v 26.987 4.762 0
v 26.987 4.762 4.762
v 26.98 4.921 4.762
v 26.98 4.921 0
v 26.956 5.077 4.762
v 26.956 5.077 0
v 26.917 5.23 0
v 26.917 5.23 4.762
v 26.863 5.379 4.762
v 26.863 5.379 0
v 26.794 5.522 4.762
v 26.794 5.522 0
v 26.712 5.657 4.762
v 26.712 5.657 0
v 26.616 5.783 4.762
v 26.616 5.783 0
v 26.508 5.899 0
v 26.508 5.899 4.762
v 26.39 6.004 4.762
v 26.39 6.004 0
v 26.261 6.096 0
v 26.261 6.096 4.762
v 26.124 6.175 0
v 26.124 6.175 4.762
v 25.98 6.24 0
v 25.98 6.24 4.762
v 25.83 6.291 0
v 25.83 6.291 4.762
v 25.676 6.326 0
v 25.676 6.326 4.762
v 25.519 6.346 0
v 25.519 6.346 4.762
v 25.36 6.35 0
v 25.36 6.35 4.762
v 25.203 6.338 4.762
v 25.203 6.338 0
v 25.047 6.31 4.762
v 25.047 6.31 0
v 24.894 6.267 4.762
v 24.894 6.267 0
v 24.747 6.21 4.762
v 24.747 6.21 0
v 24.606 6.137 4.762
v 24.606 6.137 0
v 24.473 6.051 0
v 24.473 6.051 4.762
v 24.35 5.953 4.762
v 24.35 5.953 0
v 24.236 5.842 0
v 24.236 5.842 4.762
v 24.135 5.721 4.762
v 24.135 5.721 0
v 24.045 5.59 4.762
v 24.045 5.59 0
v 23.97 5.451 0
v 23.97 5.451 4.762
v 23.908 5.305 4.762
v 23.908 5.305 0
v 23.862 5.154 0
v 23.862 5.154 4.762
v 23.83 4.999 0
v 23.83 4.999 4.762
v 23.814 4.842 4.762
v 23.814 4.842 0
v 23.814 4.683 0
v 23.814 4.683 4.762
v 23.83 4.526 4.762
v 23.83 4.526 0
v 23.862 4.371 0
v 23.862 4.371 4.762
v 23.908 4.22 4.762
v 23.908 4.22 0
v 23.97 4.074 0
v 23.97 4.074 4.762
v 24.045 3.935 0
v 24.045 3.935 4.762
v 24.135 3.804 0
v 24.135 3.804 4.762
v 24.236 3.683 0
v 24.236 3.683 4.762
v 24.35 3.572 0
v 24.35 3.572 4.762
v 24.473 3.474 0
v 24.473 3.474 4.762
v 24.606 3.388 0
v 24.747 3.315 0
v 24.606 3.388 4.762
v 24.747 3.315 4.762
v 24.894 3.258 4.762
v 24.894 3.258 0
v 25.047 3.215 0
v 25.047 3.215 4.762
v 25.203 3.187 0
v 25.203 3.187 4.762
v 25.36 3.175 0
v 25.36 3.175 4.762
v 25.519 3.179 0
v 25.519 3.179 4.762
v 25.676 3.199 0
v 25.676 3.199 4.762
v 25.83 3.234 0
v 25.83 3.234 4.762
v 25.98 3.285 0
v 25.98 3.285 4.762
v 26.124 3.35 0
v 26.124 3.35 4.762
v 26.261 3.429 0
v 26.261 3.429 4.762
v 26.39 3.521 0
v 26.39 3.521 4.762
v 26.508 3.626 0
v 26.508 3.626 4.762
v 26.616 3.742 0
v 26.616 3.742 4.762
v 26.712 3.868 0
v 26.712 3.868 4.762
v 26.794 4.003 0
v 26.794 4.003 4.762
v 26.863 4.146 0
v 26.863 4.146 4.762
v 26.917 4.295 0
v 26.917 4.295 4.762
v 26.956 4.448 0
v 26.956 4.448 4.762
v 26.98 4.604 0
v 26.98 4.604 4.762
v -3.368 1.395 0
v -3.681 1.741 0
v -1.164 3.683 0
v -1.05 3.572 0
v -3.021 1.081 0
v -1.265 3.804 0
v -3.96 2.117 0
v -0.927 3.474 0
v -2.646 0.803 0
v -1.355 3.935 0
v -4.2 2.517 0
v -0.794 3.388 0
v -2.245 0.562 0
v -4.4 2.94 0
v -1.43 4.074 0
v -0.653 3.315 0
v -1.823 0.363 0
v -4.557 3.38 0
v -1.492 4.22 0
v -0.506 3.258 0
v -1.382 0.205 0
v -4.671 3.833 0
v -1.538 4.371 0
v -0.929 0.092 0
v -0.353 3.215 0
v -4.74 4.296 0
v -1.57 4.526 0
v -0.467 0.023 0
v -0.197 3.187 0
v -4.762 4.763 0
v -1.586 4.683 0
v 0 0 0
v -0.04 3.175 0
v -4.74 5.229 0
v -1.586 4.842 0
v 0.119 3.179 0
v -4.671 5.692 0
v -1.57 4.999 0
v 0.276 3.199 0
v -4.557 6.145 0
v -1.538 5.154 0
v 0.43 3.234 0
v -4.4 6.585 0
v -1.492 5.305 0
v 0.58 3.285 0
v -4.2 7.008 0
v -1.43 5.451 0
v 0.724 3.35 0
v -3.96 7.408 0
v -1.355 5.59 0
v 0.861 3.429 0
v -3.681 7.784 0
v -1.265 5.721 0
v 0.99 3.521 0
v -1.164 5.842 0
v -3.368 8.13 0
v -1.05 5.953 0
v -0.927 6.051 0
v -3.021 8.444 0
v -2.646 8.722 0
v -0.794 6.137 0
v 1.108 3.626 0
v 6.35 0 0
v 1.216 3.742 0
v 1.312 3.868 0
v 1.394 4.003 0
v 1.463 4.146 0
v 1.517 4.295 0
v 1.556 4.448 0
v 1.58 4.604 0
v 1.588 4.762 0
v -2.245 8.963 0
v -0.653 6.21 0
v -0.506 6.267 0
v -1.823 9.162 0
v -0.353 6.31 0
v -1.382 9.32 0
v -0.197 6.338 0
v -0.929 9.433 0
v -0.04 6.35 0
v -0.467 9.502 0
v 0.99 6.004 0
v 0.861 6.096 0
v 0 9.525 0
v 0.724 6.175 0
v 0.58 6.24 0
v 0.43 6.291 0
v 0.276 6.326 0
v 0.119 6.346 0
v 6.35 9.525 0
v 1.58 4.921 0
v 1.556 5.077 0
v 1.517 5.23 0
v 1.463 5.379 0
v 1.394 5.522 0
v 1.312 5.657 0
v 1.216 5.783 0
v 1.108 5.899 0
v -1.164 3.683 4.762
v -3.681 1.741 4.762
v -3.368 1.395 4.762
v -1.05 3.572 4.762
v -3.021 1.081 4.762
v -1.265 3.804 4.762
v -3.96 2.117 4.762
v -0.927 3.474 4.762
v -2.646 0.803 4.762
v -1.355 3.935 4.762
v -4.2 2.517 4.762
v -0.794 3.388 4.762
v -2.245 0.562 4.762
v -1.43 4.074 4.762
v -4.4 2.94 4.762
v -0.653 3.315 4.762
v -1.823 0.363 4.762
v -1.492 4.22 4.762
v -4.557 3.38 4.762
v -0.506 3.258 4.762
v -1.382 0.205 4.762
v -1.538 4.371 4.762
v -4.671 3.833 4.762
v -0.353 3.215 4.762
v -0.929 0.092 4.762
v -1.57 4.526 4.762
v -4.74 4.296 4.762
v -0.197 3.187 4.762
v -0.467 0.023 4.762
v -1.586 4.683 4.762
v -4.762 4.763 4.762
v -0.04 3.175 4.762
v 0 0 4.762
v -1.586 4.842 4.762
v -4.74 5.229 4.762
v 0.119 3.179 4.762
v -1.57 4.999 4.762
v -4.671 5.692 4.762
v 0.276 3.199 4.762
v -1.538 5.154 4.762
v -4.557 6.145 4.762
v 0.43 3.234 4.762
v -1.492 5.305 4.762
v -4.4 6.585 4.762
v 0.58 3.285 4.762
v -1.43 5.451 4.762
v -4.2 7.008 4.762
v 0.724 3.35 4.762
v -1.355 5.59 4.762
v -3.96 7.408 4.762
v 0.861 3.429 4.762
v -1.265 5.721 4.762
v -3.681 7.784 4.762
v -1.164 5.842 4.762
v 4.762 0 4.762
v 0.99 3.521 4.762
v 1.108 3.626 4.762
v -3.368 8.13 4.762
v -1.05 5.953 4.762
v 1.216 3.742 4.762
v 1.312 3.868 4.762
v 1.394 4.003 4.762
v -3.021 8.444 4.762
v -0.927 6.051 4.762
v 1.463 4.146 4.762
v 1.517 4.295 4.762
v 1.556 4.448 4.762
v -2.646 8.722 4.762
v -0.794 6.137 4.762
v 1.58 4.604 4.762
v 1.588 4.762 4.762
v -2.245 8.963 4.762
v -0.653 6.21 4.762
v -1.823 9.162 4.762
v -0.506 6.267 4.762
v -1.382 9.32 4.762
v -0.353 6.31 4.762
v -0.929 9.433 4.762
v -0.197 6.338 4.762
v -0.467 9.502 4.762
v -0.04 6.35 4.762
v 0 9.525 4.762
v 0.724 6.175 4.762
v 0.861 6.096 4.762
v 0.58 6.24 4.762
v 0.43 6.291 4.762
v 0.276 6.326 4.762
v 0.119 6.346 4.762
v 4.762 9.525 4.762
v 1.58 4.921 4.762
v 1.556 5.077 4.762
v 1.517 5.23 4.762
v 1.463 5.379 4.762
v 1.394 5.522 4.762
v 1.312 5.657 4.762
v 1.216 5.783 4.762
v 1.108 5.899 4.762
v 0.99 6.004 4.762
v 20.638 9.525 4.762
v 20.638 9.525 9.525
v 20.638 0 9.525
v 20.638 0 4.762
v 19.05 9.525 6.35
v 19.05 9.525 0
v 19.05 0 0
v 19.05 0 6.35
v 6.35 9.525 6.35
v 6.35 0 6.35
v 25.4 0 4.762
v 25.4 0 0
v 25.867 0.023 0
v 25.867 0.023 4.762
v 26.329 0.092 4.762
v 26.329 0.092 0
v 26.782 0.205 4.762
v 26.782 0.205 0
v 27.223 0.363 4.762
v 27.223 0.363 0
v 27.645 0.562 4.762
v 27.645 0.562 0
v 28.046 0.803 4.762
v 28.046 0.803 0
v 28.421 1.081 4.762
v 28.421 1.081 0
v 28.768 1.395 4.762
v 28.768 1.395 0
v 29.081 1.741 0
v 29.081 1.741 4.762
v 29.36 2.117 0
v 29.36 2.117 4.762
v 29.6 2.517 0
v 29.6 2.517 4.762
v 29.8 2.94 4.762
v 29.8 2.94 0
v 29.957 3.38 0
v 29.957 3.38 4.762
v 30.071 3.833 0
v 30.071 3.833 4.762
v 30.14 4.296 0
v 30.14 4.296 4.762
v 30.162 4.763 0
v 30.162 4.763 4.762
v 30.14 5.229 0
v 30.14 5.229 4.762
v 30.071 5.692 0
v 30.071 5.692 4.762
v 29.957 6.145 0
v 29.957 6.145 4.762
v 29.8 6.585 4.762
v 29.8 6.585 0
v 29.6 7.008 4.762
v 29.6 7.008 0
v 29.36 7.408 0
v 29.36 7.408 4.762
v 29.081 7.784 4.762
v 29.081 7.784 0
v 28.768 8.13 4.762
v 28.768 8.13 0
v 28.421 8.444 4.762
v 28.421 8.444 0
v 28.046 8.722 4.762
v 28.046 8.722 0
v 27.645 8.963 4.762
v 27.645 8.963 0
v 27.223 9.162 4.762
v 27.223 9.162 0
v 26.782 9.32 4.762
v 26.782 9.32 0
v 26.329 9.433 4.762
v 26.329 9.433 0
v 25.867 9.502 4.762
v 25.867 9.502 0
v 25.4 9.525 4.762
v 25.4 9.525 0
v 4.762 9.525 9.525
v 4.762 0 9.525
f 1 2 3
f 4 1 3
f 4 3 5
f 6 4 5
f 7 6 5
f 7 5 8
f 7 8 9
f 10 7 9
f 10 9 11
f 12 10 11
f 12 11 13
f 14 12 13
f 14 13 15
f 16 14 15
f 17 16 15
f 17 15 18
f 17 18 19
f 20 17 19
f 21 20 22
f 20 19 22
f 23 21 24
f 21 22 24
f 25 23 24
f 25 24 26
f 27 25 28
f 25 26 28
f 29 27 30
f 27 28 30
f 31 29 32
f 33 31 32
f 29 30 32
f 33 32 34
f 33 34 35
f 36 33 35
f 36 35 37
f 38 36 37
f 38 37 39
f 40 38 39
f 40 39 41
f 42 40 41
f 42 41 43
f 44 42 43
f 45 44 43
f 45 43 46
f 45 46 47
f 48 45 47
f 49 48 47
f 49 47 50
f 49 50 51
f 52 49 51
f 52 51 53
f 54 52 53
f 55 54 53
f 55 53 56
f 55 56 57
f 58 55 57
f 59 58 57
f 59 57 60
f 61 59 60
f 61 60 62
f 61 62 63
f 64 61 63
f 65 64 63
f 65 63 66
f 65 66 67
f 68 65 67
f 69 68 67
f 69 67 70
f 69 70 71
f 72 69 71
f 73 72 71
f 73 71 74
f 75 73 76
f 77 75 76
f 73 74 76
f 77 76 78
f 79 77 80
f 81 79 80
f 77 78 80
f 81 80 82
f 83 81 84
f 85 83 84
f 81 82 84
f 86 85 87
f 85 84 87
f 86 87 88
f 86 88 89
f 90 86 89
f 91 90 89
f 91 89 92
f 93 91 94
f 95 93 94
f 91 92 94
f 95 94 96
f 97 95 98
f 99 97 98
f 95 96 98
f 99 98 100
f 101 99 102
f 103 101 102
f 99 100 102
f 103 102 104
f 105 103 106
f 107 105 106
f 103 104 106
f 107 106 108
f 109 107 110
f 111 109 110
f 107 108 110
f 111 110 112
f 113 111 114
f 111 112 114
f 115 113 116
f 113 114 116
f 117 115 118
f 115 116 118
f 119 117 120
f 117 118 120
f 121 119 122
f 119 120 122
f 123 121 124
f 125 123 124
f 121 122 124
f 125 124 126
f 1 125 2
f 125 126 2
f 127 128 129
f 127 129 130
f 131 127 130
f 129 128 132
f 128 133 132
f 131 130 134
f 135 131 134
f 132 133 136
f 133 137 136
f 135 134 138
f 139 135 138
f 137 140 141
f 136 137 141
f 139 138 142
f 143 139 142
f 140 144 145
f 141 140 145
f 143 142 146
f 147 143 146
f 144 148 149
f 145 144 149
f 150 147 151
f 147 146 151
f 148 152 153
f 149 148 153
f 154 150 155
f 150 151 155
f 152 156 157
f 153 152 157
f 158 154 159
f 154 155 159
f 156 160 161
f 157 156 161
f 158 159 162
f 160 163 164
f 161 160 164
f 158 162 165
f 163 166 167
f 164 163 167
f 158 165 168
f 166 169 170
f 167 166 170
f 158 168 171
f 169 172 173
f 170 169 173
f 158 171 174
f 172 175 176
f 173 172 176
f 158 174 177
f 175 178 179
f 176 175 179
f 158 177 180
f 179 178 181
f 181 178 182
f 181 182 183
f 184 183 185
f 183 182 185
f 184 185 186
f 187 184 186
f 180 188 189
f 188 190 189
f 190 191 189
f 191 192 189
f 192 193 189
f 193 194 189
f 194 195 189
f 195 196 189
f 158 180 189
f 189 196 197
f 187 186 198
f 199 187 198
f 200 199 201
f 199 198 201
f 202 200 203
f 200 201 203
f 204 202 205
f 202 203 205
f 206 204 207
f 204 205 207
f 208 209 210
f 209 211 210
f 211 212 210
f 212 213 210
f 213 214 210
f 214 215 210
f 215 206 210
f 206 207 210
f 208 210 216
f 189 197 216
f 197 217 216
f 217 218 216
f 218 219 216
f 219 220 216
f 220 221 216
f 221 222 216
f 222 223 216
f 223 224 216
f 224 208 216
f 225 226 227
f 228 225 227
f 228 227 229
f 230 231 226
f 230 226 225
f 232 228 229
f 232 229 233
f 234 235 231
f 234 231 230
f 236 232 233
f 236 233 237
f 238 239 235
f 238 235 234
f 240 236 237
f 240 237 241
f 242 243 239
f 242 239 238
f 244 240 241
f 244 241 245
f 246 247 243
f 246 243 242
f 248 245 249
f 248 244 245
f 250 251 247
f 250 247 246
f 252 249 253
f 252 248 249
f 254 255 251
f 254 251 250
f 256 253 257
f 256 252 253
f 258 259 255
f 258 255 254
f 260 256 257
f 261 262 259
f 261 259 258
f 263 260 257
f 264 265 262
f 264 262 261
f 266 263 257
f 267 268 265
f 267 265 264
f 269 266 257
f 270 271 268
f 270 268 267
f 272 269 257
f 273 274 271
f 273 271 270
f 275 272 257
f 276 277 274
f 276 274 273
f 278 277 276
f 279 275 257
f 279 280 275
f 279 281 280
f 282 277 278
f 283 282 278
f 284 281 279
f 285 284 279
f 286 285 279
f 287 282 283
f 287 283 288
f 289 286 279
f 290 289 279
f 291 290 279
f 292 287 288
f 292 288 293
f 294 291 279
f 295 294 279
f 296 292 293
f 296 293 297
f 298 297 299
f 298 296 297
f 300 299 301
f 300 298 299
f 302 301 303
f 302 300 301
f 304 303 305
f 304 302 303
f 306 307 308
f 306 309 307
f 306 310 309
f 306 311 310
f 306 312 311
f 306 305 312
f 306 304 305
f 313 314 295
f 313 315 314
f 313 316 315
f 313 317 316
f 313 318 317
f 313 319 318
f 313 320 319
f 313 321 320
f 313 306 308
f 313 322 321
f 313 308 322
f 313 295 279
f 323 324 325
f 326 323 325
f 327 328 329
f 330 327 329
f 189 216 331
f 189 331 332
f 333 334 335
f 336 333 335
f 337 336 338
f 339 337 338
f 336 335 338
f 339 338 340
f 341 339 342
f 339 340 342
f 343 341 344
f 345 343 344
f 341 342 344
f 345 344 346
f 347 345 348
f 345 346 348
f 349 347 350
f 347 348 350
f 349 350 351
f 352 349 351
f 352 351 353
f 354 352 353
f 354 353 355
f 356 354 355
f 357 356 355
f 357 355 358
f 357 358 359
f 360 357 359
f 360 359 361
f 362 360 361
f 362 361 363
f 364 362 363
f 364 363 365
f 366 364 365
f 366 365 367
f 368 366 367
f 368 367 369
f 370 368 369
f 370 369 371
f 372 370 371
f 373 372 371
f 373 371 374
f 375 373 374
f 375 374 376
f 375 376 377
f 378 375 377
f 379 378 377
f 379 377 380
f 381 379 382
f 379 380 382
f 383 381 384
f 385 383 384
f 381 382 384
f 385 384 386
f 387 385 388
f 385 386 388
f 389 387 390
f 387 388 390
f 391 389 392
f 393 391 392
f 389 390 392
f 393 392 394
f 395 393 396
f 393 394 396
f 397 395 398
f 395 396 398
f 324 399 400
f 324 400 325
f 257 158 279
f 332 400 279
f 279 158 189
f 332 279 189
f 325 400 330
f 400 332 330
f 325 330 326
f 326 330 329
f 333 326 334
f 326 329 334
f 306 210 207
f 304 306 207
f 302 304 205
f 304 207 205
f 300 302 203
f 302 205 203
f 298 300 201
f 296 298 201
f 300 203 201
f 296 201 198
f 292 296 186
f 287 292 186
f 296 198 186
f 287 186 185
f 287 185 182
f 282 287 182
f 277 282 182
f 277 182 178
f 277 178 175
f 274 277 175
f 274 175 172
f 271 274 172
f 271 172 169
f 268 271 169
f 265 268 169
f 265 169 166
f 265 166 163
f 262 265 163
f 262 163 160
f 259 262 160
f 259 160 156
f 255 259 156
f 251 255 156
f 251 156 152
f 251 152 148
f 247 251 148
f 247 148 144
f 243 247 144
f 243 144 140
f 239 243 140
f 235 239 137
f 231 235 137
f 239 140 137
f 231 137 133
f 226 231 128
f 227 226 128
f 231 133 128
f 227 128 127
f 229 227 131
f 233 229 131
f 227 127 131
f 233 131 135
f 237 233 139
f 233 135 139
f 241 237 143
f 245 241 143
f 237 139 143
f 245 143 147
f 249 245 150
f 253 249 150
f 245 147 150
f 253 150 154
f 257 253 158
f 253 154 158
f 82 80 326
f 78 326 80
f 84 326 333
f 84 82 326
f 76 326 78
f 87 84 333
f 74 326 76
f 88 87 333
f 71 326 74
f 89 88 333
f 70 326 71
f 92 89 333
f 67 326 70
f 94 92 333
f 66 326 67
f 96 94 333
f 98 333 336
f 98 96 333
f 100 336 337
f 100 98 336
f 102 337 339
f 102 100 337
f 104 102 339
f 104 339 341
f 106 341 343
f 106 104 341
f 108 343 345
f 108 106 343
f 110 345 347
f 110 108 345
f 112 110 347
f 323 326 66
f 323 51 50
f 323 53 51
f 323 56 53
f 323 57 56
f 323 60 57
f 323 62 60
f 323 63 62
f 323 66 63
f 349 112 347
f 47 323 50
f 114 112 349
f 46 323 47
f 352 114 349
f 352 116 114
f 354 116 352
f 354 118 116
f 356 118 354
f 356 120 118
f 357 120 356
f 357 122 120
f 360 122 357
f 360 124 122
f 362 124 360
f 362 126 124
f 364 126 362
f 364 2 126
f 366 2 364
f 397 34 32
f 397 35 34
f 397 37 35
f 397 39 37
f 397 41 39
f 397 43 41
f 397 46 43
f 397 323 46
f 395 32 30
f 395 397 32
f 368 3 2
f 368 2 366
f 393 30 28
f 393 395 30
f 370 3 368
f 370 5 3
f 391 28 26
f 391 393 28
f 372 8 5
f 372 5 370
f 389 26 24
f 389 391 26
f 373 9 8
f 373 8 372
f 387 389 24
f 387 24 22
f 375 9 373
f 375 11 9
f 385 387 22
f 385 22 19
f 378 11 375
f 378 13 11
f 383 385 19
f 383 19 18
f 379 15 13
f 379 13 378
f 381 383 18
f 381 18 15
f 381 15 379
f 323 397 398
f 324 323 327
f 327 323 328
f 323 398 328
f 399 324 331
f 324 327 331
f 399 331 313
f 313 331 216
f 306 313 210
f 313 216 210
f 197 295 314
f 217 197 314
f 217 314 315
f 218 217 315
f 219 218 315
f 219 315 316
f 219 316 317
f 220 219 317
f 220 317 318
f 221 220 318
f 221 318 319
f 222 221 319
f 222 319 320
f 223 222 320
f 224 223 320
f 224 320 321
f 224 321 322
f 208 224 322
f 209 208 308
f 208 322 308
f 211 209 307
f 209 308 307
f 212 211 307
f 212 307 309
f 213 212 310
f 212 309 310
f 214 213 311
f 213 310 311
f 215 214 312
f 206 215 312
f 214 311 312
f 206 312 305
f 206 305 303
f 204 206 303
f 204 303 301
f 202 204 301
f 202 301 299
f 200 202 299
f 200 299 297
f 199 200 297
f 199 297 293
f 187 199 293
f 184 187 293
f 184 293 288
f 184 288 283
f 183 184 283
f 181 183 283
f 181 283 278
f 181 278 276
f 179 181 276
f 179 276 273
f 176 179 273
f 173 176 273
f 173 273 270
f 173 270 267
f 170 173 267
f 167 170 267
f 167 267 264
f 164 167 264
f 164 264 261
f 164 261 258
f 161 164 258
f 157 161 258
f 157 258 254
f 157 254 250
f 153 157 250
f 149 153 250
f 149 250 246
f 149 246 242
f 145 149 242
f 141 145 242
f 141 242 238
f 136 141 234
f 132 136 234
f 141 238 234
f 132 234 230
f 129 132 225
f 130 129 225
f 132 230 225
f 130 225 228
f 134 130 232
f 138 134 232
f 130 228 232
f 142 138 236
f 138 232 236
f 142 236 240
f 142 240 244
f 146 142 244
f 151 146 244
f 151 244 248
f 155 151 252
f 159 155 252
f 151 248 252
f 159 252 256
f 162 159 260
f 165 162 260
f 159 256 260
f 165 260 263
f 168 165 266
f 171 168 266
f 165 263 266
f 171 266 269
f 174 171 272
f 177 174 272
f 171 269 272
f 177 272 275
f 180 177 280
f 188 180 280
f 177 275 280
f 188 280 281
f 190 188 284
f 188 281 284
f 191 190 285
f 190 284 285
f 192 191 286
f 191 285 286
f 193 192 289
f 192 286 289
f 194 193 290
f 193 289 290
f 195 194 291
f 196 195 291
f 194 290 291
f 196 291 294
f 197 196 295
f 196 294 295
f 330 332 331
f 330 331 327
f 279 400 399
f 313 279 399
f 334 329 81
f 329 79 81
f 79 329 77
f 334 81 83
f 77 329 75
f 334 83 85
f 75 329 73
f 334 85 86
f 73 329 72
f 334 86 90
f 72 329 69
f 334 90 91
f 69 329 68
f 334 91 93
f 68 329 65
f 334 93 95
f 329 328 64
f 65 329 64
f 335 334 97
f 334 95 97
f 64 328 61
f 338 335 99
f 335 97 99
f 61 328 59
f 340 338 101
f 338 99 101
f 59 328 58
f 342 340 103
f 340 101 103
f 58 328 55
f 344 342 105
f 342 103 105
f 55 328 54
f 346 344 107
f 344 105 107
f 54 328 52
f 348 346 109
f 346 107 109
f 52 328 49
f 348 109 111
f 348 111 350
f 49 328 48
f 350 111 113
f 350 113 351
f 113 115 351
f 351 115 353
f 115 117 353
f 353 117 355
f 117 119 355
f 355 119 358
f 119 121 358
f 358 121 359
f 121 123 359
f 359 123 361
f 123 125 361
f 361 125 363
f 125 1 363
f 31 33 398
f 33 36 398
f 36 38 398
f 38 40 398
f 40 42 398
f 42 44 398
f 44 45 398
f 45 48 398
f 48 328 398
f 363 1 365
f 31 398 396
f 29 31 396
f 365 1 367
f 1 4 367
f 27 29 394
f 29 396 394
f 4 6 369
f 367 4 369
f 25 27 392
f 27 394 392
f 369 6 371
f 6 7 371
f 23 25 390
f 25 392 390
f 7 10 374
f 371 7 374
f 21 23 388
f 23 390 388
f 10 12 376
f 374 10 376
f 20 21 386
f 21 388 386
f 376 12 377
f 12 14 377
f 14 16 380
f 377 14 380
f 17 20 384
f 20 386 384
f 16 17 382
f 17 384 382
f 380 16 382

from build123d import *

# Parameters (mm, degrees)
F1_DEPTH = 9.525
F2_W     = 12.7
F2_H     = 9.525
F3_DEPTH = 6.35
F5_DEPTH = 4.7625
F7_R     = 1.5875
F6_R     = 1.5875
F8_DEPTH = 25.4


# Not quite as in the source:
# - a feature names something its author has since deleted; it is built from what else it names


with BuildPart() as f1:
    # F0 (on Top) → F1 (new body)
    with BuildSketch(Plane.XY):
        with BuildLine():
            ThreePointArc((0, 9.525), (-4.7625, 4.7625), (0, 0))
            Line((0, 0), (25.4, 0))
            ThreePointArc((25.4, 0), (30.1625, 4.7625), (25.4, 9.525))
            Line((25.4, 9.525), (0, 9.525))
        make_face()
    extrude(amount=F1_DEPTH)

    # F2 (on face) → F3 (cut)
    with BuildSketch(Plane(origin=(0, 0, 0), x_dir=(1, 0, 0), z_dir=(0, 0, -1))):
        with Locations((12.7, -4.7625)):
            Rectangle(F2_W, F2_H)
    extrude(amount=-F3_DEPTH, mode=Mode.SUBTRACT)

    # F4 (on face) → F5 (cut)
    with BuildSketch(Plane.XY.offset(9.525)):
        with BuildLine():
            Line((4.7625, 9.525), (0, 9.525))
            ThreePointArc((0, 9.525), (-4.7625, 4.7625), (0, 0))
            Line((0, 0), (4.7625, 0))
            Line((4.7625, 0), (4.7625, 9.525))
        make_face()
        with BuildLine():
            Line((25.4, 9.525), (20.6375, 9.525))
            Line((20.6375, 9.525), (20.6375, 0))
            Line((20.6375, 0), (25.4, 0))
            ThreePointArc((25.4, 0), (30.1625, 4.7625), (25.4, 9.525))
        make_face()
    extrude(amount=-F5_DEPTH, mode=Mode.SUBTRACT)

    # F7 (on face) + F6 (on face) → F8 (cut)
    with BuildSketch(Plane.XY.offset(4.7625)):
        with Locations((0, 4.7625)):
            Circle(F7_R)
    with BuildSketch(Plane.XY.offset(4.7625)):
        with Locations((25.4, 4.7625)):
            Circle(F6_R)
    extrude(amount=-F8_DEPTH, mode=Mode.SUBTRACT)


solid = f1.part
